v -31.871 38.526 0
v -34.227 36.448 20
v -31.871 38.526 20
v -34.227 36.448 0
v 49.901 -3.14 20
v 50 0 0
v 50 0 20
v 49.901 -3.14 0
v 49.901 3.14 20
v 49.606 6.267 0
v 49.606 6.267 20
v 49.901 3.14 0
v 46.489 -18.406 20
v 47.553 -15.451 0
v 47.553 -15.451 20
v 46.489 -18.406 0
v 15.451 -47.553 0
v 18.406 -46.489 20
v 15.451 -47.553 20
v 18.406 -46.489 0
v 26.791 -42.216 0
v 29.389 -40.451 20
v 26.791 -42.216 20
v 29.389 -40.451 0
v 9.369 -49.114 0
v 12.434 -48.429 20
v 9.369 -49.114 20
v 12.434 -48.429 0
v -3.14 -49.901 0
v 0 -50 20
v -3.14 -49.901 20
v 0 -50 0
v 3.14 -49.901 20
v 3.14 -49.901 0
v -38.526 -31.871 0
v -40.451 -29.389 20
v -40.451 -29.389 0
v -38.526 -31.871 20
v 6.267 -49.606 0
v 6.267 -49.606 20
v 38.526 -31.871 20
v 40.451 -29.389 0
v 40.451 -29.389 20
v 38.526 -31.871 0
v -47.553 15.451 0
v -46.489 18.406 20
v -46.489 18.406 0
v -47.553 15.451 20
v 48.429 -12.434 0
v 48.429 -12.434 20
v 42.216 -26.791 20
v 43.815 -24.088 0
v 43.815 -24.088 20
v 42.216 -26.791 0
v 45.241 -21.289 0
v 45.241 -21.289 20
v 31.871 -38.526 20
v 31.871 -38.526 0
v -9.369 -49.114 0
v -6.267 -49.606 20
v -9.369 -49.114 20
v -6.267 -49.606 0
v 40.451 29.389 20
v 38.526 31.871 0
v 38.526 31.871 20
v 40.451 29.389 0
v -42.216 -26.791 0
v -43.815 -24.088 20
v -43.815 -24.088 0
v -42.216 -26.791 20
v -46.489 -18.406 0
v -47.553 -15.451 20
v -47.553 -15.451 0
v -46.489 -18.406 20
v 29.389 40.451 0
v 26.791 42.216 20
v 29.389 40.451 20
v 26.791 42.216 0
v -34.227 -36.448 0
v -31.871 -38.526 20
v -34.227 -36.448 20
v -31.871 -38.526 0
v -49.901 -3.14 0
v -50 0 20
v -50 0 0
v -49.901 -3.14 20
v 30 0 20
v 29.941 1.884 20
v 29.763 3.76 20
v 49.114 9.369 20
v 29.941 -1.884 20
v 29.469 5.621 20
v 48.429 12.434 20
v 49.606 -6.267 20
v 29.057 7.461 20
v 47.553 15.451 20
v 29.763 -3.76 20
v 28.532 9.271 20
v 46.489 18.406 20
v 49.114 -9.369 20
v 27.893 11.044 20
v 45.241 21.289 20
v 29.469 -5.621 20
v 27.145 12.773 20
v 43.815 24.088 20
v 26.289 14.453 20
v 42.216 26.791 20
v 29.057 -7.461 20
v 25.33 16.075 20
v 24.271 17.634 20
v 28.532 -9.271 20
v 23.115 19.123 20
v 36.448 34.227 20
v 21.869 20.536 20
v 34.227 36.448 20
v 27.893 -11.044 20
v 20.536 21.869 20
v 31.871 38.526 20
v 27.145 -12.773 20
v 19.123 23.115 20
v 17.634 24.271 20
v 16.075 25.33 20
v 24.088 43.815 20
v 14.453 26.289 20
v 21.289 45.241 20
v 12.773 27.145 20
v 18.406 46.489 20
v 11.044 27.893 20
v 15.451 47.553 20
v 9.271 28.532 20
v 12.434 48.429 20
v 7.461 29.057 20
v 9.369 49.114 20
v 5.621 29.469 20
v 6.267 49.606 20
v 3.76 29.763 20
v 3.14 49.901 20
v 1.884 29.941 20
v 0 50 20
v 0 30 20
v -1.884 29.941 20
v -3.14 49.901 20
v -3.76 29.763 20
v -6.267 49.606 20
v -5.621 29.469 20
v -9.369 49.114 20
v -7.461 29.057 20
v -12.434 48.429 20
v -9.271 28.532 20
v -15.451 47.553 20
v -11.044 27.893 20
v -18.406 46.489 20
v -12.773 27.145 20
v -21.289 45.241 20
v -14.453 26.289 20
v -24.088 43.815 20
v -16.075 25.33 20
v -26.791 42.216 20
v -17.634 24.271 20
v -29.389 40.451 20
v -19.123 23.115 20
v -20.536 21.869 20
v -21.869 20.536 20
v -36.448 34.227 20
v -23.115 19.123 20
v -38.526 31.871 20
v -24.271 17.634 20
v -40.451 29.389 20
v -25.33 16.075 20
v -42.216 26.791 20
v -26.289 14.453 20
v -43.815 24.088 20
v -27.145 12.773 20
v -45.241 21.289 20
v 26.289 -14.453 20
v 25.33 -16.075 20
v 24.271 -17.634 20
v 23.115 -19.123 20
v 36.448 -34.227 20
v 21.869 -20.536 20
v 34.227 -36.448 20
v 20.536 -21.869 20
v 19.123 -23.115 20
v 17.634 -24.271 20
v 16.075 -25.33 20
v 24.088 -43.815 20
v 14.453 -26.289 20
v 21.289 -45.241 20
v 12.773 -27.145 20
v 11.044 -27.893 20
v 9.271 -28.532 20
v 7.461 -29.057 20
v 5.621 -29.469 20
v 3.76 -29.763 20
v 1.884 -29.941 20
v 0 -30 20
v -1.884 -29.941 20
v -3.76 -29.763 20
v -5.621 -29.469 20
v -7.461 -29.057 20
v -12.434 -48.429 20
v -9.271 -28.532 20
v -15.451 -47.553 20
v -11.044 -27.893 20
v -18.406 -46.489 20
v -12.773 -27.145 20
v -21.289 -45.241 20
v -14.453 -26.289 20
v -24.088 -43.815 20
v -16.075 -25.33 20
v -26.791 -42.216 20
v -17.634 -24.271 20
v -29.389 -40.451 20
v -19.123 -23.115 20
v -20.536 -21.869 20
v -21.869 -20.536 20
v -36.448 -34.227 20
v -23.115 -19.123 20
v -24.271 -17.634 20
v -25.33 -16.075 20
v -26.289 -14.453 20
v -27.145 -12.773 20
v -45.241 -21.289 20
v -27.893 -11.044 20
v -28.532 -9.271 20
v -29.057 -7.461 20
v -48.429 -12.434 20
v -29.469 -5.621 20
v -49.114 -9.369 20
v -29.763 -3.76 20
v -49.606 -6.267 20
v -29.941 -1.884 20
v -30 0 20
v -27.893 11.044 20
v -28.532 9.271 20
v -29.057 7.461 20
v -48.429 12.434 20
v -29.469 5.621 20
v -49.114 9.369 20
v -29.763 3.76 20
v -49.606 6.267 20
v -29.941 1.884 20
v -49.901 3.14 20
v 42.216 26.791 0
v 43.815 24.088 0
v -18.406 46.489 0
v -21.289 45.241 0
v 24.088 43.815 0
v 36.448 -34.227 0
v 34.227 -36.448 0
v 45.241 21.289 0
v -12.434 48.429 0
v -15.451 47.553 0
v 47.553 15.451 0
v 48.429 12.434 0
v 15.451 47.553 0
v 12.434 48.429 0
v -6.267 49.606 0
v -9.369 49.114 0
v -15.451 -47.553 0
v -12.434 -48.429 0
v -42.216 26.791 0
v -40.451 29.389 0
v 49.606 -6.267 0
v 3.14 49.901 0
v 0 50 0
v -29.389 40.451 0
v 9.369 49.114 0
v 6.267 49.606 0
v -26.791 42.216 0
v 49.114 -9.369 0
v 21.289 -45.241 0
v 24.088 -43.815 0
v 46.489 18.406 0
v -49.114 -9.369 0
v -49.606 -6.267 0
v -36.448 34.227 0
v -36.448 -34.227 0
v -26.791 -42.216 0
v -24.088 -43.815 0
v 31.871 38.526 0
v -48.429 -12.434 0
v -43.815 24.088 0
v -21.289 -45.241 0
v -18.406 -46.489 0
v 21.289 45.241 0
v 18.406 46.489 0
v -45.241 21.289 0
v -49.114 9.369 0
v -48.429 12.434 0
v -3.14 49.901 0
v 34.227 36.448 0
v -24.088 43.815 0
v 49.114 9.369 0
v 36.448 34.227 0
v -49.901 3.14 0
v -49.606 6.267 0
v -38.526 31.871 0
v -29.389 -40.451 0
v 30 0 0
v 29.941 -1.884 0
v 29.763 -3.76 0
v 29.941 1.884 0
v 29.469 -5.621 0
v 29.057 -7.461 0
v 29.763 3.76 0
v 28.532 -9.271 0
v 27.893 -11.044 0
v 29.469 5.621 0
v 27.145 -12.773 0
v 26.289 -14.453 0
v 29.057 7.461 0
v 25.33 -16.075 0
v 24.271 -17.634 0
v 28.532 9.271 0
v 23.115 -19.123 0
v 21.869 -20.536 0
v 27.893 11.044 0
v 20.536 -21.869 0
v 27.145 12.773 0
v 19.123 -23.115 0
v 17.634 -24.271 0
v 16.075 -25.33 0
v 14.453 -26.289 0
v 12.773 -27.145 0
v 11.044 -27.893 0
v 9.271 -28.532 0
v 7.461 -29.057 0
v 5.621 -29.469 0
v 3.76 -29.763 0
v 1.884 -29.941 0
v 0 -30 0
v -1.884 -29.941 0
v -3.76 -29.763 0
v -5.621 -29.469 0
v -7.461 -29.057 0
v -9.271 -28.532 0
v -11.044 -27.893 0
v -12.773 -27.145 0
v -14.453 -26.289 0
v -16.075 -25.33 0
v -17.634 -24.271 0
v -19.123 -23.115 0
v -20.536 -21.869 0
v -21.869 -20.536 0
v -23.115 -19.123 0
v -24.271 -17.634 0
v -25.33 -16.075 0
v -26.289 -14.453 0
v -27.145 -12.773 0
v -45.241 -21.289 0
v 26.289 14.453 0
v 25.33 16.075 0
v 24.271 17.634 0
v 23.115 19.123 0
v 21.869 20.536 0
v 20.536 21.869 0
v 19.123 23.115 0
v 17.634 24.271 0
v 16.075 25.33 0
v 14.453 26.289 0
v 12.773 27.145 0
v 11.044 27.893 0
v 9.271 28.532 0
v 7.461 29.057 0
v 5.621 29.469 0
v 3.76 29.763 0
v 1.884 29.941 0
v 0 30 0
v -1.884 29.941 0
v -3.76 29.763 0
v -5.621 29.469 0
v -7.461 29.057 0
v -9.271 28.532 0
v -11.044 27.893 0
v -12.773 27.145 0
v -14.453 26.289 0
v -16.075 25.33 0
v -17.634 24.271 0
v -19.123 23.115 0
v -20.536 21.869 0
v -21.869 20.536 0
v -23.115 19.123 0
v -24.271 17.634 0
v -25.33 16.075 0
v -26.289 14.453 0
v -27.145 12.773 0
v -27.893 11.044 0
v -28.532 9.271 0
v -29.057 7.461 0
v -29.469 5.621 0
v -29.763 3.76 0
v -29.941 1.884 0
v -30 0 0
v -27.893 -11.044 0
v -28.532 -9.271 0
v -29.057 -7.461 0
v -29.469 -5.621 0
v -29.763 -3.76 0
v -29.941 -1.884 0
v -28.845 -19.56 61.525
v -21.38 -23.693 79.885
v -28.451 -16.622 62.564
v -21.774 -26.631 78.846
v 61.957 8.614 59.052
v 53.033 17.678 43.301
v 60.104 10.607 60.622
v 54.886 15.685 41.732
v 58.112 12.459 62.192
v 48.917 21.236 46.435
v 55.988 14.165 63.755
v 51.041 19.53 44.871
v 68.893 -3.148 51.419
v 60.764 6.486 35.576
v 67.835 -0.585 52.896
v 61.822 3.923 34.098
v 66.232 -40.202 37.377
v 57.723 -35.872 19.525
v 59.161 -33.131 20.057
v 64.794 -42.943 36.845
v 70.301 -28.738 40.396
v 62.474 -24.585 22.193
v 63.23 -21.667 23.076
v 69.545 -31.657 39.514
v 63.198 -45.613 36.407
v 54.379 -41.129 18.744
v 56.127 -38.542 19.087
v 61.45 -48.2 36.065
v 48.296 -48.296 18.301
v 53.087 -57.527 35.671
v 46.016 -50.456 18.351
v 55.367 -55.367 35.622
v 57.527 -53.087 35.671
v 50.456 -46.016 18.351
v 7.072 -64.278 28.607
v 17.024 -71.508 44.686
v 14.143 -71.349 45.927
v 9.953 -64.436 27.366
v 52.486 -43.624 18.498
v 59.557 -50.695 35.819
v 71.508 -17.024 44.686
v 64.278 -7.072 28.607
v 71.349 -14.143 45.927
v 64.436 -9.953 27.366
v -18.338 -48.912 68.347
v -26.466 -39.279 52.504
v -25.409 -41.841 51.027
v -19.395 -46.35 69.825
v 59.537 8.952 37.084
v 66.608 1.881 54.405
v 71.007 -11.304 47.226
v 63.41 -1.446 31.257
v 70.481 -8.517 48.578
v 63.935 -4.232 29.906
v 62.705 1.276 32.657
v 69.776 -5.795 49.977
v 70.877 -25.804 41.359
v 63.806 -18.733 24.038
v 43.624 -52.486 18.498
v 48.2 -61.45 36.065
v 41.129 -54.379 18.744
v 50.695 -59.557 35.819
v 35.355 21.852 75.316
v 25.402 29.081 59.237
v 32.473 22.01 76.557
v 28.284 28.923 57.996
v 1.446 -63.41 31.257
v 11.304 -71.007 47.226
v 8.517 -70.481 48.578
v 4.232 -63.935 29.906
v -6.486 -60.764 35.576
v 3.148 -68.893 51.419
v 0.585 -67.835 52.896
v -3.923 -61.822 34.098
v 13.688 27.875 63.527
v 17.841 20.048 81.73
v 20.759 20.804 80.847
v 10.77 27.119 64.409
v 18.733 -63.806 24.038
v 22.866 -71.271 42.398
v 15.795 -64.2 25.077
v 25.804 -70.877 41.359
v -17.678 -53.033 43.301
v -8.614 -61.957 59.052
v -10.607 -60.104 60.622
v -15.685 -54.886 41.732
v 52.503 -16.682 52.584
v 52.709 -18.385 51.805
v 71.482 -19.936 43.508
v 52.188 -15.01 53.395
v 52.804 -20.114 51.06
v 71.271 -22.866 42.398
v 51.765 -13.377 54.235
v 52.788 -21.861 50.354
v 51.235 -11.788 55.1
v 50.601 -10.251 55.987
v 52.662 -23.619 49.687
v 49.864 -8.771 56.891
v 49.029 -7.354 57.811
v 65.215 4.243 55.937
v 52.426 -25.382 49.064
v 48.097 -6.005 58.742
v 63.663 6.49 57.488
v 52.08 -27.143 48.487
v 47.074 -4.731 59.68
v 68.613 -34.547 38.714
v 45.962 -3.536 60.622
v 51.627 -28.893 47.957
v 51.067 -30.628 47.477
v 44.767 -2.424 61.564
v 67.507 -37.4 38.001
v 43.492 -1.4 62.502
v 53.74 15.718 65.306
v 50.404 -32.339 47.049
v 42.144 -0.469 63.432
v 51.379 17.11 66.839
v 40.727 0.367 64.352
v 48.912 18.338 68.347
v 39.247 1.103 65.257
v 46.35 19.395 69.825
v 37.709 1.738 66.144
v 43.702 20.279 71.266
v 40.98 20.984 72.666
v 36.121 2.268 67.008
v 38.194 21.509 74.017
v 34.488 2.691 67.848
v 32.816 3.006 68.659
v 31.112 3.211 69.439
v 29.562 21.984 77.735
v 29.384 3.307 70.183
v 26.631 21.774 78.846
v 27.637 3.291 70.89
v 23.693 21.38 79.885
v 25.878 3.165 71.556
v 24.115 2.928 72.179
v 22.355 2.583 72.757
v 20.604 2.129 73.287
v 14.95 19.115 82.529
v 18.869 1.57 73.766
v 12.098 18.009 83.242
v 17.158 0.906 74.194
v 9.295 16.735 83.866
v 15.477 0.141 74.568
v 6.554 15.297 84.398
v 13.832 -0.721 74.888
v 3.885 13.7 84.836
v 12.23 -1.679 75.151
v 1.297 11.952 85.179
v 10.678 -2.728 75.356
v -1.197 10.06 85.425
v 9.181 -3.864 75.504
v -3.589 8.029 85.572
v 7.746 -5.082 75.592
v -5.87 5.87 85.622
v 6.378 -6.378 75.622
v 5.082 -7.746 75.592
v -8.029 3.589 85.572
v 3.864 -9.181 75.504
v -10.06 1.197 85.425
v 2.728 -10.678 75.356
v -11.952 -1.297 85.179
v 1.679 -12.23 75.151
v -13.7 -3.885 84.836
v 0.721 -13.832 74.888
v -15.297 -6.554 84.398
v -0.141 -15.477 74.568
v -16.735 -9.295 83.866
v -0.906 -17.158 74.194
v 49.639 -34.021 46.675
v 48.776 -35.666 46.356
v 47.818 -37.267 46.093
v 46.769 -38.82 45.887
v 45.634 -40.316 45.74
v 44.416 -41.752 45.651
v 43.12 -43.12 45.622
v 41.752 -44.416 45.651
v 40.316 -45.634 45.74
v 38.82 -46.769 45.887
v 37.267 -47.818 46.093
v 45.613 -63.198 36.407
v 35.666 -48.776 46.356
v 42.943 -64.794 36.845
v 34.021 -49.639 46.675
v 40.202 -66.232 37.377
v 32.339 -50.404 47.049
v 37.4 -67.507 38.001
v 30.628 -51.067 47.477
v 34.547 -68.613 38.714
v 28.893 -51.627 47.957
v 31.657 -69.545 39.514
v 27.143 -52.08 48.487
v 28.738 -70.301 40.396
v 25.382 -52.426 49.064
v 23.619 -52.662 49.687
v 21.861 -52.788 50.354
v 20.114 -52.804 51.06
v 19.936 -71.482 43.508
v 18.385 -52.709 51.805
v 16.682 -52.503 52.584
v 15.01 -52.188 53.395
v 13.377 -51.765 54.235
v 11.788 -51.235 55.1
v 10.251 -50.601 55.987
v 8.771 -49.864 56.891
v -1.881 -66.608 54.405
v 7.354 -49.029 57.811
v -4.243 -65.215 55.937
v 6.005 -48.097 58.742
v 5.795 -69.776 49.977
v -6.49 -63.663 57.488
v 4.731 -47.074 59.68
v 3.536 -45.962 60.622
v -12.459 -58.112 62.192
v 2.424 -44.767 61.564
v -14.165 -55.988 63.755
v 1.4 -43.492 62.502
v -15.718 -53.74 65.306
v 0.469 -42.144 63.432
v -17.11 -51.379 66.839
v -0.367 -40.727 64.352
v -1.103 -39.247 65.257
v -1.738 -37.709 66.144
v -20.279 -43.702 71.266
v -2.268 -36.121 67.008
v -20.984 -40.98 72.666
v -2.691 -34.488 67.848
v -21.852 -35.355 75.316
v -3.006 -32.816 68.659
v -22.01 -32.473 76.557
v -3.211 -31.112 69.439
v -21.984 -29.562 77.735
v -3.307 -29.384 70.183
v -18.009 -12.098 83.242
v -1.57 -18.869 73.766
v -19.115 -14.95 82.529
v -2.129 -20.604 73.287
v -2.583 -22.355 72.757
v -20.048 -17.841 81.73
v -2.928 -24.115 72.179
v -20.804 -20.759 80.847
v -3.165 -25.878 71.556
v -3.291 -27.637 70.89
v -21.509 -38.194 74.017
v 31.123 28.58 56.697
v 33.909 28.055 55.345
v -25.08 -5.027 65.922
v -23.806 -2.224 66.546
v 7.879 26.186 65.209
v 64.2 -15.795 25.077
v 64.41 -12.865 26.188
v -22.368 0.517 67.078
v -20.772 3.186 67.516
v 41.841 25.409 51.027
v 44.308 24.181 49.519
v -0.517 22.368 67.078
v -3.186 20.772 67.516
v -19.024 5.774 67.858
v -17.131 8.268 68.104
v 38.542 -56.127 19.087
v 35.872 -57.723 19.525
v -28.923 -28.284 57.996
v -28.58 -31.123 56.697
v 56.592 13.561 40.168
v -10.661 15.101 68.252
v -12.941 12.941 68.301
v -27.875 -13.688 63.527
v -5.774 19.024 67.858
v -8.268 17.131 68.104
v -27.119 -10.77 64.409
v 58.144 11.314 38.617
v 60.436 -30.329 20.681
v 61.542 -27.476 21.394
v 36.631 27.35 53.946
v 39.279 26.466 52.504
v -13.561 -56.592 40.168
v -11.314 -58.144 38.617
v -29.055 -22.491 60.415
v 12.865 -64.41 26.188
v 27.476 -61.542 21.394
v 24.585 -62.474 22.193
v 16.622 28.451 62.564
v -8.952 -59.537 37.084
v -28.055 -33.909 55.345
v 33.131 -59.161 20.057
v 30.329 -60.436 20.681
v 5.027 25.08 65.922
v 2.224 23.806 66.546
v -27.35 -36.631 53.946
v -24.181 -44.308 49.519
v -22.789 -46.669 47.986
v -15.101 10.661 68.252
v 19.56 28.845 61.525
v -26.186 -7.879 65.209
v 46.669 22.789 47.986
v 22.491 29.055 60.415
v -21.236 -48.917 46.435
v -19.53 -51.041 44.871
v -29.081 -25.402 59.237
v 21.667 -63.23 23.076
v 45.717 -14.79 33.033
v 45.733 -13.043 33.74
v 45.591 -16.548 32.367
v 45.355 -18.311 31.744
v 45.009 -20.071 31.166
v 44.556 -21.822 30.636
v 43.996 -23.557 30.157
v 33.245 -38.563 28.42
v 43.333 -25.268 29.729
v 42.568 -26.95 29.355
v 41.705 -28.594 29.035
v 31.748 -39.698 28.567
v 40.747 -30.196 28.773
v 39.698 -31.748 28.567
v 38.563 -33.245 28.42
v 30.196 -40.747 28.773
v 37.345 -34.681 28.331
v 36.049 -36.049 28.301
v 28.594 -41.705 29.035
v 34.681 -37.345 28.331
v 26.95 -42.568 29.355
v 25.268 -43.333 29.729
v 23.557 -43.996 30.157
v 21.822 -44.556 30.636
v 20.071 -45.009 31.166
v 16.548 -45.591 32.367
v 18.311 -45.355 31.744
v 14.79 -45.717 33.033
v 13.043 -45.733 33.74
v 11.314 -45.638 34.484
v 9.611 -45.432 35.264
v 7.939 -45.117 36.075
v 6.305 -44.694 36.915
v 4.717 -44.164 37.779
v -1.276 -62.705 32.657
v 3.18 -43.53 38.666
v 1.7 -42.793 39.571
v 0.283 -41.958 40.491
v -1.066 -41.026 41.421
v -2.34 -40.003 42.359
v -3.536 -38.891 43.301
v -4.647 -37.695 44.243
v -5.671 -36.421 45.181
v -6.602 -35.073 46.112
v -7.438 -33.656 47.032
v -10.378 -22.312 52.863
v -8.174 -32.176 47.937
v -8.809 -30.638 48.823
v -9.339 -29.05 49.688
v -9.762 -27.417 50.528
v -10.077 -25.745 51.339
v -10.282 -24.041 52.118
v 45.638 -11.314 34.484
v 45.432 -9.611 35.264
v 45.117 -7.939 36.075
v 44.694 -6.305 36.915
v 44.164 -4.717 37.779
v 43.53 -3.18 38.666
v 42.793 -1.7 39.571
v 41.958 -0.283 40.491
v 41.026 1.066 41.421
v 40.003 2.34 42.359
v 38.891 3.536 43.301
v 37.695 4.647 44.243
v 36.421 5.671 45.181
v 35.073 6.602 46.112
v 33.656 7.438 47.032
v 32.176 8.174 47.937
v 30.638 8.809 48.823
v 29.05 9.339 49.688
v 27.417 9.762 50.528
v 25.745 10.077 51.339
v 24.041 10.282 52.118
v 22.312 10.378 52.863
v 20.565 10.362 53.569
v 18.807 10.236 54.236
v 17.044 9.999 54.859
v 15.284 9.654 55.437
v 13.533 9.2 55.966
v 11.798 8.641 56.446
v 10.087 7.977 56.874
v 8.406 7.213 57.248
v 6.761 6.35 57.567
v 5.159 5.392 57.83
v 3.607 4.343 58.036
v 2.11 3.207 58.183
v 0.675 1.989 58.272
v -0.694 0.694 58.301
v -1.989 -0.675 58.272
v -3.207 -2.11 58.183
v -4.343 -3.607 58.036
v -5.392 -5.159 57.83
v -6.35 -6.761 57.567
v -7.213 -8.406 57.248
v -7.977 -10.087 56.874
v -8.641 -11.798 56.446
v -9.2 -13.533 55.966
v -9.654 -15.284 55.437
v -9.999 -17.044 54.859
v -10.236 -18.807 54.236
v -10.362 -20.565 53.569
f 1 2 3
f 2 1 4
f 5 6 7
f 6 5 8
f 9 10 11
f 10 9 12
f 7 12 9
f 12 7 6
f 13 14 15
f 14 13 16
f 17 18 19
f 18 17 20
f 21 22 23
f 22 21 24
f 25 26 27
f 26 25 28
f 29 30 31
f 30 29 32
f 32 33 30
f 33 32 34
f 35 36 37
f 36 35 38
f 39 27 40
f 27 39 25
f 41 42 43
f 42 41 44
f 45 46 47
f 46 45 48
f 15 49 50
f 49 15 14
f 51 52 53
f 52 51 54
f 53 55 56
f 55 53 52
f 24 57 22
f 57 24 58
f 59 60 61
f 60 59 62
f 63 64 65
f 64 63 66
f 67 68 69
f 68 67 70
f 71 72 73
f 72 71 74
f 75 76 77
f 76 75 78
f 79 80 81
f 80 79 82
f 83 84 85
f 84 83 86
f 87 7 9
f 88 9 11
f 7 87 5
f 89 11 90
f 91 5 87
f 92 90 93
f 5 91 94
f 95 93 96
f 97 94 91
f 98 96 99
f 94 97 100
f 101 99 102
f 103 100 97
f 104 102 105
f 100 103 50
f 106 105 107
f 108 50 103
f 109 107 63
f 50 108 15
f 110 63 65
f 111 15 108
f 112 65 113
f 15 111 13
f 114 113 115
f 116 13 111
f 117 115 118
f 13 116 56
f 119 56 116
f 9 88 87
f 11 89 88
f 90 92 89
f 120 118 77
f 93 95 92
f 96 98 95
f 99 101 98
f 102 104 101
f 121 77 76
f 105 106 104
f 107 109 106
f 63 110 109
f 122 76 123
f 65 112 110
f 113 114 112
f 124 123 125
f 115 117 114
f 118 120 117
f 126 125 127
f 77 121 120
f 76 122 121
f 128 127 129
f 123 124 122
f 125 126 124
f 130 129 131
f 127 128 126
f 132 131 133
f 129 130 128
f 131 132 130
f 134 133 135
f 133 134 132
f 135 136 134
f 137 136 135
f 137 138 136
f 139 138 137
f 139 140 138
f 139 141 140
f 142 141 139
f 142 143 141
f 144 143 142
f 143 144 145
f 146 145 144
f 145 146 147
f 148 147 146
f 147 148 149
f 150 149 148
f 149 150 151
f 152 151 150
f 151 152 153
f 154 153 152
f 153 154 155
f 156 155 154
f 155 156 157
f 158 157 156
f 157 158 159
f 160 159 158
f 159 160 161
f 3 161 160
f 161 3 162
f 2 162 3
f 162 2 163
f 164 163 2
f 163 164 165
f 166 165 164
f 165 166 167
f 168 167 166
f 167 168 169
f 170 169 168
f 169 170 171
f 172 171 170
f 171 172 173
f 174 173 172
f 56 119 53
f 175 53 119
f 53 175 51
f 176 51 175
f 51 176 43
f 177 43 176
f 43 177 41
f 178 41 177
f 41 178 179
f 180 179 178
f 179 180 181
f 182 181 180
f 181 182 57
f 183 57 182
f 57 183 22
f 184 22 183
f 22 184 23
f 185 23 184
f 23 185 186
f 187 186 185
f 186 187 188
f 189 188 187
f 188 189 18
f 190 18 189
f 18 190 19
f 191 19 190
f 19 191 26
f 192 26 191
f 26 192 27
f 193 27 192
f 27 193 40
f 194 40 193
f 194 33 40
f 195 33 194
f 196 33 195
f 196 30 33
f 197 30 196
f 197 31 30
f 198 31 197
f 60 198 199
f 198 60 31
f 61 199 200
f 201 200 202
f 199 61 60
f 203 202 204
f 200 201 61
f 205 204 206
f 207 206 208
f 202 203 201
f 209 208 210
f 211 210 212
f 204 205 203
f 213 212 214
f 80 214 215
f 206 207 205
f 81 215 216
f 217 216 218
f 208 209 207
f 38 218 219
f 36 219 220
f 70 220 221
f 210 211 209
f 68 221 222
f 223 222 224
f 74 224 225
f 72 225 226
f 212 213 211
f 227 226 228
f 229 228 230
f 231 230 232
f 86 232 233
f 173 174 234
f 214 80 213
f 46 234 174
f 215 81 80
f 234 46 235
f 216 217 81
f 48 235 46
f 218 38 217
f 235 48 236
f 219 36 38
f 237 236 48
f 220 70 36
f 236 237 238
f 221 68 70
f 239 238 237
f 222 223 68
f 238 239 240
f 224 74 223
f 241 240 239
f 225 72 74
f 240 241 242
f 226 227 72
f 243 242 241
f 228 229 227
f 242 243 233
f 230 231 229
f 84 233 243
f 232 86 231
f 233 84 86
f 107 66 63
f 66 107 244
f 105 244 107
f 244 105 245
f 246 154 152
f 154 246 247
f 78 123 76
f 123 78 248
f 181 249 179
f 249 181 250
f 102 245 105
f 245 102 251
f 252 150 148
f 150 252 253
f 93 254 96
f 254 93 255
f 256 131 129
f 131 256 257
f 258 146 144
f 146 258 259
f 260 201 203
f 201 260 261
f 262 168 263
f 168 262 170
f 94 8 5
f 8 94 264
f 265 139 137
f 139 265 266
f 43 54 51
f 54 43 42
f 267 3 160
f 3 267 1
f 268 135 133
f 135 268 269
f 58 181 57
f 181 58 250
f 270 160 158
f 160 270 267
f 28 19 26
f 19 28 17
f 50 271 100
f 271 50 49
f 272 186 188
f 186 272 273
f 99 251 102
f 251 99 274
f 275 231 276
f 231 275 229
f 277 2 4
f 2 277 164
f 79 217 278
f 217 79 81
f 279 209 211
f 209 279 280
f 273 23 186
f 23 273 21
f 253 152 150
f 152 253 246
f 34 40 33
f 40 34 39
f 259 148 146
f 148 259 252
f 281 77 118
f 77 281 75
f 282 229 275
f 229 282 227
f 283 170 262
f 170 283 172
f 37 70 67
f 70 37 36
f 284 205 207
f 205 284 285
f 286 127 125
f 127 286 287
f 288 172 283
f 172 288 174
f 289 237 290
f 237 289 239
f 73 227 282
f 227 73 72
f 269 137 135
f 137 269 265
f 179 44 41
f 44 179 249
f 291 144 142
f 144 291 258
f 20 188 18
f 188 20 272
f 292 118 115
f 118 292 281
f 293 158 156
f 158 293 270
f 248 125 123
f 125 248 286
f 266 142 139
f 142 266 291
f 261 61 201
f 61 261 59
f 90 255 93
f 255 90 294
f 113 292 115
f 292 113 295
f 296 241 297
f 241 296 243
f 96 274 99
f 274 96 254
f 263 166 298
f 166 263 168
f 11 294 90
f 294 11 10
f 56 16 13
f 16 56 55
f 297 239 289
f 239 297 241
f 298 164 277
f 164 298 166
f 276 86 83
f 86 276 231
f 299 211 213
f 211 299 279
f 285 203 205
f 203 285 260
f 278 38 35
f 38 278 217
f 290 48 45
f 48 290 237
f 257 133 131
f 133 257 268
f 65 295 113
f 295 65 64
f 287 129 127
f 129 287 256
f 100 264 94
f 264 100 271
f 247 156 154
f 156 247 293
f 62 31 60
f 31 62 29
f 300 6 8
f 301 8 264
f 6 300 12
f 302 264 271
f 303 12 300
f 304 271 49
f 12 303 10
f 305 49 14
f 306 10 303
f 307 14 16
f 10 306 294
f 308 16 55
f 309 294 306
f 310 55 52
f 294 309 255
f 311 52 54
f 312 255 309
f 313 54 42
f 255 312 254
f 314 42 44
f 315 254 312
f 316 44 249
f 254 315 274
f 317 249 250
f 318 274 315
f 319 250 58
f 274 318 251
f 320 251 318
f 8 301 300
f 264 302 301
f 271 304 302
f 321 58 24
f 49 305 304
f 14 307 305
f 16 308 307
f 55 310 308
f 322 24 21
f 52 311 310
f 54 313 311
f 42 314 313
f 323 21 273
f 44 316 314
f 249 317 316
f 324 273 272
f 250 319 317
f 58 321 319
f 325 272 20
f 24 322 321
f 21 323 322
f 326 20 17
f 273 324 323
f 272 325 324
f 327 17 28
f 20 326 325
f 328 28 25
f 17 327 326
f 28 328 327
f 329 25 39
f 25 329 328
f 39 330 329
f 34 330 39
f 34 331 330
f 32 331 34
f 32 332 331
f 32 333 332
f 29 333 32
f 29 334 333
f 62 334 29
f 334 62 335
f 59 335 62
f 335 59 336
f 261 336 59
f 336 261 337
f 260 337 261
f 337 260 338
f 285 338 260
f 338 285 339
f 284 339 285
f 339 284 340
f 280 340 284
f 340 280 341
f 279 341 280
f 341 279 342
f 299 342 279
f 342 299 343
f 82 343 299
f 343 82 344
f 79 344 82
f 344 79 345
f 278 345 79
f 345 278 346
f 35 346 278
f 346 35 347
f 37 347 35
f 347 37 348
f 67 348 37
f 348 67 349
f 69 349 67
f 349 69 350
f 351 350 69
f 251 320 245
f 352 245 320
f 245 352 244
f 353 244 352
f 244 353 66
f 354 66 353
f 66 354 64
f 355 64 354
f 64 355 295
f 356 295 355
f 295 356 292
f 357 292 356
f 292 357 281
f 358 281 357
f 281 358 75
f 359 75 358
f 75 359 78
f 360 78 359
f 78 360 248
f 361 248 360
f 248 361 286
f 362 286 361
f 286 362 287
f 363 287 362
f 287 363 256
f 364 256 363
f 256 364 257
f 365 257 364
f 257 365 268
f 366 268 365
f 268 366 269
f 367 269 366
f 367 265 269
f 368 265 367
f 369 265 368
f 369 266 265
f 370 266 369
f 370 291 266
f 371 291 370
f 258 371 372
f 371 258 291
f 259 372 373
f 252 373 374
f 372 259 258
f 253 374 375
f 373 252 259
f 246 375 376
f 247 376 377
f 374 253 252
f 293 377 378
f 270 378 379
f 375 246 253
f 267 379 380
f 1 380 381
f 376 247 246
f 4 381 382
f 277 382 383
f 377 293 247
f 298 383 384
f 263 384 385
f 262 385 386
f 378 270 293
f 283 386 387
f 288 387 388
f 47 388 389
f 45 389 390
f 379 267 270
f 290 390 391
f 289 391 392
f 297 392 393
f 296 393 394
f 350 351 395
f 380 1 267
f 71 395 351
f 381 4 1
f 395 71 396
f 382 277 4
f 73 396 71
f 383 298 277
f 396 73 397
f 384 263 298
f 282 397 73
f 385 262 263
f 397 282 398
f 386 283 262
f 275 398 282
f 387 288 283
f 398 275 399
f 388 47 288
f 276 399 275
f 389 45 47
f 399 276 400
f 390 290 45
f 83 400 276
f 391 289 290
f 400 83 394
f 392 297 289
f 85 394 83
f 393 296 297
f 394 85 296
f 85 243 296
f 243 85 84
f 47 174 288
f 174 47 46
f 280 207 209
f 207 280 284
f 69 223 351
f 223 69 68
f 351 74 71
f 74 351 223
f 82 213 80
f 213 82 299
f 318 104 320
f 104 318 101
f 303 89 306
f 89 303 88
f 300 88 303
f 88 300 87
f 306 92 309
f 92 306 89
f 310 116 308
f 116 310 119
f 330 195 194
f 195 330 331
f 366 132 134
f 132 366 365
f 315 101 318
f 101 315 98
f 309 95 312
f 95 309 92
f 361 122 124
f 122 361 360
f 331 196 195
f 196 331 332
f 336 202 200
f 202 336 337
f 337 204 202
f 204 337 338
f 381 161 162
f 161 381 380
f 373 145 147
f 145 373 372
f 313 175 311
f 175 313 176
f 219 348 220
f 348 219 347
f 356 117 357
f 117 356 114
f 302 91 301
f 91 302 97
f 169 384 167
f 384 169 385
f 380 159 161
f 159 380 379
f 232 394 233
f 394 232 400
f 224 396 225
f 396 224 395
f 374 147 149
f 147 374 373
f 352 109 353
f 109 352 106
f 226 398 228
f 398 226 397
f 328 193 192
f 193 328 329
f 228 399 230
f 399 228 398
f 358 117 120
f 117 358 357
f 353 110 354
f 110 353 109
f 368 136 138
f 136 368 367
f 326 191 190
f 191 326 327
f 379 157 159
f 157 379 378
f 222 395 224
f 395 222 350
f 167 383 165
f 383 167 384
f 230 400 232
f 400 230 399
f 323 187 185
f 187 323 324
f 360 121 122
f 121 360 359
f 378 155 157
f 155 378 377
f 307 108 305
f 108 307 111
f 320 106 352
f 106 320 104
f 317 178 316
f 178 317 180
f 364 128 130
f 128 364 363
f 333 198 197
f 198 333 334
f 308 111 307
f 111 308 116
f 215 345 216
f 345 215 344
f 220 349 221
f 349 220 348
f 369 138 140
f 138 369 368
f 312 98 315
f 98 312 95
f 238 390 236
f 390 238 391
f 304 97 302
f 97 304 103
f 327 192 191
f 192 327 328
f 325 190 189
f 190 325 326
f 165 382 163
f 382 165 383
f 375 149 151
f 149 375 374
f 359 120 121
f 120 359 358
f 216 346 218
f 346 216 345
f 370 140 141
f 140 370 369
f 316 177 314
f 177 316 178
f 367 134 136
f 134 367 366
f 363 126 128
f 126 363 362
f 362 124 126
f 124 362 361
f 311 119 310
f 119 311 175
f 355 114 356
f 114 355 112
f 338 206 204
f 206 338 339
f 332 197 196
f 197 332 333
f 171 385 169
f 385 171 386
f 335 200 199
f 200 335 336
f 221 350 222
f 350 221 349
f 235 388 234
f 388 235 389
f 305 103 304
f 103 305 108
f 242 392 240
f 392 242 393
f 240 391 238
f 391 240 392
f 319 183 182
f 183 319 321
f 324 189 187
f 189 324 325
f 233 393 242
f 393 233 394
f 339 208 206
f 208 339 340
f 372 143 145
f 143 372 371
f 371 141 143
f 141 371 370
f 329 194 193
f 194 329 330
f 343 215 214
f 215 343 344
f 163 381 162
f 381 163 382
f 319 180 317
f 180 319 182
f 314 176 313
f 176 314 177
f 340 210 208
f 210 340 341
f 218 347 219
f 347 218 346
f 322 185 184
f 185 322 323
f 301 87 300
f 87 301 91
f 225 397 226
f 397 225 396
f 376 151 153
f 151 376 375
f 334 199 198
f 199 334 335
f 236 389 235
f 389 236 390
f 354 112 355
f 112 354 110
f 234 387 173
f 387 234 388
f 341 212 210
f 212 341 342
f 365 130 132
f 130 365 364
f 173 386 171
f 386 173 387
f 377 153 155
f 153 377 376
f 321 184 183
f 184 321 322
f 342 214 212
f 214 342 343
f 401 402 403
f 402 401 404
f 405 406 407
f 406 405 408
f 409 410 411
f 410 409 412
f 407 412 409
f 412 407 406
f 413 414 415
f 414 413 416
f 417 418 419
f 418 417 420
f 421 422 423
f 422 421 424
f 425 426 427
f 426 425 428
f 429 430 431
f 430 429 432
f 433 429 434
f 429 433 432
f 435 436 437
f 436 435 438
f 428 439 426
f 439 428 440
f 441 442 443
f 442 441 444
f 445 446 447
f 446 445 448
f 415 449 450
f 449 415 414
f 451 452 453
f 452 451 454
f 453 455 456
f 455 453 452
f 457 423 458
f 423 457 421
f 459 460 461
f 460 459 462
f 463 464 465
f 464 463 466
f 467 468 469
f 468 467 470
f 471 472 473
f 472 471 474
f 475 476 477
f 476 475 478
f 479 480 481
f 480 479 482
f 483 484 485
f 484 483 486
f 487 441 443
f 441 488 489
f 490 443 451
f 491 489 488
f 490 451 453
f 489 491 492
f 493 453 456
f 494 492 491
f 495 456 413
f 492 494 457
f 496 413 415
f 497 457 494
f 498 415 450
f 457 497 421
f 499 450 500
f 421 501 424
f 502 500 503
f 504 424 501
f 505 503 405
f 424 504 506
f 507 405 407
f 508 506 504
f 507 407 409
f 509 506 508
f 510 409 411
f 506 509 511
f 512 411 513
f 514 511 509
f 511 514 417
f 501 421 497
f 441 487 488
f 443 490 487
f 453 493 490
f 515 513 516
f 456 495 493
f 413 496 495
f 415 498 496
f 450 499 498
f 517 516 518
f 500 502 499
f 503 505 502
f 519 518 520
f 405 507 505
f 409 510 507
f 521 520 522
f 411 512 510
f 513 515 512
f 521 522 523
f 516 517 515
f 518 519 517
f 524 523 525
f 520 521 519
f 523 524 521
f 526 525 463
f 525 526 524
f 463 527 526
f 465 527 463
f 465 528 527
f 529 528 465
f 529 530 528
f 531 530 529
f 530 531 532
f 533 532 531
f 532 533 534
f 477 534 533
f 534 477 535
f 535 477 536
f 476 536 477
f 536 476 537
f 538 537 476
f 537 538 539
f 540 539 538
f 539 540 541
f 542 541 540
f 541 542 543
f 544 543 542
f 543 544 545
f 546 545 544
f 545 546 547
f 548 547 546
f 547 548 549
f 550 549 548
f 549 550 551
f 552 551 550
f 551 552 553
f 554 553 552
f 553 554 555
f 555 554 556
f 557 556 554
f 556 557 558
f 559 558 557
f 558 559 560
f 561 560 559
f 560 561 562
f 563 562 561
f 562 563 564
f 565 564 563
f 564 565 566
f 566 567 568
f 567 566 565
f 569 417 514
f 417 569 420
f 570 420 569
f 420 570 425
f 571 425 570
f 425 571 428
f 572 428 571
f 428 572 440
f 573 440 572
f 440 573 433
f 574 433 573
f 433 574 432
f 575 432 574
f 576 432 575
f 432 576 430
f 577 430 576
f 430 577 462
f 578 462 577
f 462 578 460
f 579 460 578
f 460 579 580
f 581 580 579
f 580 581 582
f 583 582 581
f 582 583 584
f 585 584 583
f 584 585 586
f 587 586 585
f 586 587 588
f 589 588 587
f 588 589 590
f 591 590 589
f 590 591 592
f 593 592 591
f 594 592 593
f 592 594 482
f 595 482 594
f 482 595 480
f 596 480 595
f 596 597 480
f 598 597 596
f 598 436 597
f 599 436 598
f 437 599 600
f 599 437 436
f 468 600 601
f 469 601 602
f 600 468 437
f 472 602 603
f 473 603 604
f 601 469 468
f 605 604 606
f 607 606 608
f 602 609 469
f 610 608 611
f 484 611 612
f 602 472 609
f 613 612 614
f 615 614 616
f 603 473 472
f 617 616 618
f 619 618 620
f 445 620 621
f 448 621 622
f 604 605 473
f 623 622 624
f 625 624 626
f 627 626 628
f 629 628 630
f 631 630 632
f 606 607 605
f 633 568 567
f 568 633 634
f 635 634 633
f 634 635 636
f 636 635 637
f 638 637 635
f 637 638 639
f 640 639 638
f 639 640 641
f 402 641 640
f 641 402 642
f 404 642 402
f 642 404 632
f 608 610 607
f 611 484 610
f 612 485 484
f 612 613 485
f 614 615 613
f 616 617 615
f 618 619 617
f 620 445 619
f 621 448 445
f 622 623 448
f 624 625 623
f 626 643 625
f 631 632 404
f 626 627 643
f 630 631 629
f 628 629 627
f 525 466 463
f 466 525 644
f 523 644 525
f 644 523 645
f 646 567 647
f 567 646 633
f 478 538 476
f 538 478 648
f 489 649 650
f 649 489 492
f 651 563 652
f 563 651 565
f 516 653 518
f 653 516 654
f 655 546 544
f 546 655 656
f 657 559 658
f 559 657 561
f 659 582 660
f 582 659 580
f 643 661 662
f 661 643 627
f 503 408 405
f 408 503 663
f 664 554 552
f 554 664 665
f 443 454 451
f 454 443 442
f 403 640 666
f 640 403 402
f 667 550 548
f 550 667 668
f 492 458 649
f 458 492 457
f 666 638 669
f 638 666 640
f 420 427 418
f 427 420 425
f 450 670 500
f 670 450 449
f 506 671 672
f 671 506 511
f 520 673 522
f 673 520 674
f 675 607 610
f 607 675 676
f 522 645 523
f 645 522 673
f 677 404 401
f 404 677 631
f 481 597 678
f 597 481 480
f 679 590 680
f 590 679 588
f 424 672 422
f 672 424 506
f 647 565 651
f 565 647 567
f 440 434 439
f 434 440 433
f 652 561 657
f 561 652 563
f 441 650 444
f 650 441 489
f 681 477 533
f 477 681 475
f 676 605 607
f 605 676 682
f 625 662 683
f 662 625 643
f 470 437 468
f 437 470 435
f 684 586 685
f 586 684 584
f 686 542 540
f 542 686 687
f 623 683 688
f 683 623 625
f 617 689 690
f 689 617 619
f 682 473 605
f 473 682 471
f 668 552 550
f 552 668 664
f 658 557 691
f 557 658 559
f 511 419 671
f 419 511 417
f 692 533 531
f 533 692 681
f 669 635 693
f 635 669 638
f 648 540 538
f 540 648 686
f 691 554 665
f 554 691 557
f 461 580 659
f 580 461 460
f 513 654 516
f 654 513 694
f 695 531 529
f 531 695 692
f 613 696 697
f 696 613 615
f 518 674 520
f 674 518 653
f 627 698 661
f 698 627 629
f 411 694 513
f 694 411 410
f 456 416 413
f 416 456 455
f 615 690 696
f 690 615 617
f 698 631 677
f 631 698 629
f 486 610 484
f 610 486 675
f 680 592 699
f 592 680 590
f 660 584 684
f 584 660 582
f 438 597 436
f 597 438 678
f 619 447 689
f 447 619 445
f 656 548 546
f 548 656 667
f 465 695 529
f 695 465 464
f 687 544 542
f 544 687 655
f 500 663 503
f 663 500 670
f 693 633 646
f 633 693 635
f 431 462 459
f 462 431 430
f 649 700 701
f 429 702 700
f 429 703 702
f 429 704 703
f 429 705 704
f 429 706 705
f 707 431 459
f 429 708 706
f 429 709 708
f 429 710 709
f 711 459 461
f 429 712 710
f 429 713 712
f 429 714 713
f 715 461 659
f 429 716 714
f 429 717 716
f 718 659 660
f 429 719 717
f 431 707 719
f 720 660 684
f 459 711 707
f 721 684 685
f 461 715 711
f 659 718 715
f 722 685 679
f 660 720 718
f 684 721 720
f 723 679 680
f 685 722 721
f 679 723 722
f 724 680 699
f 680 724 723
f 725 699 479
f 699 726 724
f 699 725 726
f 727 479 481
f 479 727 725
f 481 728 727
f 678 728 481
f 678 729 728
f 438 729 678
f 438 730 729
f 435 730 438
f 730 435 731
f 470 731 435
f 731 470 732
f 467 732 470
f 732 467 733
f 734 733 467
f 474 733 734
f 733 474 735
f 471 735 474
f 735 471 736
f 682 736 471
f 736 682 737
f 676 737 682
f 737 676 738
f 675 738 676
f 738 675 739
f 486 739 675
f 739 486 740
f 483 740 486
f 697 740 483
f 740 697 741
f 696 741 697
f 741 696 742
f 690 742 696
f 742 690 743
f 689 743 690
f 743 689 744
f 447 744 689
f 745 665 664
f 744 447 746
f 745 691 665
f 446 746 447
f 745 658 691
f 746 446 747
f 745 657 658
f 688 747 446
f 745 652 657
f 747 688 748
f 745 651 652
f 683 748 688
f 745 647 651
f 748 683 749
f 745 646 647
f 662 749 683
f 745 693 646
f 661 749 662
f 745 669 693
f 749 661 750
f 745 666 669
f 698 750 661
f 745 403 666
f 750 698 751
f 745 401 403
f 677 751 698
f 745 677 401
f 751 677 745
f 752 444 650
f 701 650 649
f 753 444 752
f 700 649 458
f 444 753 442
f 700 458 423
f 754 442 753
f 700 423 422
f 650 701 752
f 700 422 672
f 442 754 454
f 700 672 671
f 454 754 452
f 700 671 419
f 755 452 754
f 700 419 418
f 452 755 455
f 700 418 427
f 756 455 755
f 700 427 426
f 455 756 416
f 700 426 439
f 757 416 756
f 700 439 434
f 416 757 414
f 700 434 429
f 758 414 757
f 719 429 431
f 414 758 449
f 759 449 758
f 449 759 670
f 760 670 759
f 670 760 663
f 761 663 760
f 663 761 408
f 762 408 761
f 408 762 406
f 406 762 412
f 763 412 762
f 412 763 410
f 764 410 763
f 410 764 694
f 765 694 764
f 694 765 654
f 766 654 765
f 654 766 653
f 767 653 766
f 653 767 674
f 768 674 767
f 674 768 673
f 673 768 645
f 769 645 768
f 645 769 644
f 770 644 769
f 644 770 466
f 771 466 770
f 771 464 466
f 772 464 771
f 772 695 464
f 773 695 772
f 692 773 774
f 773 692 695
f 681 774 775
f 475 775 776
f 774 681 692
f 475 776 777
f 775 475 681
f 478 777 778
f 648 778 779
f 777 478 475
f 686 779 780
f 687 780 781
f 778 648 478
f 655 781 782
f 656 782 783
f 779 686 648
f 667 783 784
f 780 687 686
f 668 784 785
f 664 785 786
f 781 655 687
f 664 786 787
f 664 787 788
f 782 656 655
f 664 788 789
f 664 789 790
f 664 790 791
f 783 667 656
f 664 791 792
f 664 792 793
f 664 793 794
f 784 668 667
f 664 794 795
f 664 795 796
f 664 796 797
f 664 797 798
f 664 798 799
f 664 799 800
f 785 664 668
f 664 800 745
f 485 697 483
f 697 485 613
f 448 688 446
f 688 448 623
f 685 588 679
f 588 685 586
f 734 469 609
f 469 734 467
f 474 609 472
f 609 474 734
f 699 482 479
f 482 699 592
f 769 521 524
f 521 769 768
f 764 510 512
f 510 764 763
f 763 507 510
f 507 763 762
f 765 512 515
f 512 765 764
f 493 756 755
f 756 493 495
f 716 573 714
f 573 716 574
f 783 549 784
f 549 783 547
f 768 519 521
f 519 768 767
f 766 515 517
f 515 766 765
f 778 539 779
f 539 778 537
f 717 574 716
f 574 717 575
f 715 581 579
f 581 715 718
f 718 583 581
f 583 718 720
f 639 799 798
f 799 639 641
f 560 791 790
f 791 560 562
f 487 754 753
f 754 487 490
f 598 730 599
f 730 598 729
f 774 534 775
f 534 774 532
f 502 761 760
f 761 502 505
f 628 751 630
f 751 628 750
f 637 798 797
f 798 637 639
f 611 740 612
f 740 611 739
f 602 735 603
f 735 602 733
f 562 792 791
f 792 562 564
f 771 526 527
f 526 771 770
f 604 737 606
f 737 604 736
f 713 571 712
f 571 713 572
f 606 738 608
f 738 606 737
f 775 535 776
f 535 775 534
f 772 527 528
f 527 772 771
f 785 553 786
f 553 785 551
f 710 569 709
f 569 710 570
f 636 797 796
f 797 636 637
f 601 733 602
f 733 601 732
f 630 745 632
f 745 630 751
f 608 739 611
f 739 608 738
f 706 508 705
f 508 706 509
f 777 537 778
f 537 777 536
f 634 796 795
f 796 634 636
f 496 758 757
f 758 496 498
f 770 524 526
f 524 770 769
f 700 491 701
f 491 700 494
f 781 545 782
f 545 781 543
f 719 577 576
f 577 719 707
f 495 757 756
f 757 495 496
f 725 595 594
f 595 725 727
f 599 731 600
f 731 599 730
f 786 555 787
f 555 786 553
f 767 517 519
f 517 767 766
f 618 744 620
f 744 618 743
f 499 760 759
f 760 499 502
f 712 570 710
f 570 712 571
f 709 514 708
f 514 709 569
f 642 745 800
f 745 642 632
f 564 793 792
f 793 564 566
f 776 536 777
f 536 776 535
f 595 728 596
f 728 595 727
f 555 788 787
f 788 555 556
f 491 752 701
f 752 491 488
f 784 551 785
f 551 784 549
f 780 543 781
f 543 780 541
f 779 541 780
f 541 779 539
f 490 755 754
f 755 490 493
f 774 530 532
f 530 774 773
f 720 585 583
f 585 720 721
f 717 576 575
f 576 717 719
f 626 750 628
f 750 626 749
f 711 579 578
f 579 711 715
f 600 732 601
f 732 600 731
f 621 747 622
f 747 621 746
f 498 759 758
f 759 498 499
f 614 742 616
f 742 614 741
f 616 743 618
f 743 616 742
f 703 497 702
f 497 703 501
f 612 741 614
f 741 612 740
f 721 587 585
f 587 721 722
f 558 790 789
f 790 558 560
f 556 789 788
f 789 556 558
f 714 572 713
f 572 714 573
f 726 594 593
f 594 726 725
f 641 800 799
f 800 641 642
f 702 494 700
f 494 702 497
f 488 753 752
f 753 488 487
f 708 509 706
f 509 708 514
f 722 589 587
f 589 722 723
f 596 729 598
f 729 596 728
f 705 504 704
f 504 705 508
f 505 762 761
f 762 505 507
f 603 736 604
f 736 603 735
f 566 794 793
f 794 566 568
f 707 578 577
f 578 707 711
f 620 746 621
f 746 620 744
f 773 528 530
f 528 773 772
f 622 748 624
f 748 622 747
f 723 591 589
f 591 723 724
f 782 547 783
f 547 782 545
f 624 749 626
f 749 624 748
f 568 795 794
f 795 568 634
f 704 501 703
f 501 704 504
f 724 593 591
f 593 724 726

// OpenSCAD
// Parameters for the lifesaver
diameter = 100;     // Overall diameter
thickness = 20;     // Thickness of the ring
hole_diameter = 60; // Diameter of the central hole

// Create the outer cylinder
difference() {
    cylinder(h = thickness, d = diameter, $fn=100);

    // Subtract the inner cylinder to create the hole
    translate([0, 0, -1]) // Slightly lower the inner cylinder to ensure complete subtraction
        cylinder(h = thickness + 2, d = hole_diameter, $fn=100);
}

// Tilt the lifesaver
rotate([30, 0, 45]) // Adjust the angles here for the desired tilt
    translate([0, 0, diameter/2])
        difference() {
            cylinder(h = thickness, d = diameter, $fn=100);
            translate([0, 0, -1])
                cylinder(h = thickness + 2, d = hole_diameter, $fn=100);
        }
